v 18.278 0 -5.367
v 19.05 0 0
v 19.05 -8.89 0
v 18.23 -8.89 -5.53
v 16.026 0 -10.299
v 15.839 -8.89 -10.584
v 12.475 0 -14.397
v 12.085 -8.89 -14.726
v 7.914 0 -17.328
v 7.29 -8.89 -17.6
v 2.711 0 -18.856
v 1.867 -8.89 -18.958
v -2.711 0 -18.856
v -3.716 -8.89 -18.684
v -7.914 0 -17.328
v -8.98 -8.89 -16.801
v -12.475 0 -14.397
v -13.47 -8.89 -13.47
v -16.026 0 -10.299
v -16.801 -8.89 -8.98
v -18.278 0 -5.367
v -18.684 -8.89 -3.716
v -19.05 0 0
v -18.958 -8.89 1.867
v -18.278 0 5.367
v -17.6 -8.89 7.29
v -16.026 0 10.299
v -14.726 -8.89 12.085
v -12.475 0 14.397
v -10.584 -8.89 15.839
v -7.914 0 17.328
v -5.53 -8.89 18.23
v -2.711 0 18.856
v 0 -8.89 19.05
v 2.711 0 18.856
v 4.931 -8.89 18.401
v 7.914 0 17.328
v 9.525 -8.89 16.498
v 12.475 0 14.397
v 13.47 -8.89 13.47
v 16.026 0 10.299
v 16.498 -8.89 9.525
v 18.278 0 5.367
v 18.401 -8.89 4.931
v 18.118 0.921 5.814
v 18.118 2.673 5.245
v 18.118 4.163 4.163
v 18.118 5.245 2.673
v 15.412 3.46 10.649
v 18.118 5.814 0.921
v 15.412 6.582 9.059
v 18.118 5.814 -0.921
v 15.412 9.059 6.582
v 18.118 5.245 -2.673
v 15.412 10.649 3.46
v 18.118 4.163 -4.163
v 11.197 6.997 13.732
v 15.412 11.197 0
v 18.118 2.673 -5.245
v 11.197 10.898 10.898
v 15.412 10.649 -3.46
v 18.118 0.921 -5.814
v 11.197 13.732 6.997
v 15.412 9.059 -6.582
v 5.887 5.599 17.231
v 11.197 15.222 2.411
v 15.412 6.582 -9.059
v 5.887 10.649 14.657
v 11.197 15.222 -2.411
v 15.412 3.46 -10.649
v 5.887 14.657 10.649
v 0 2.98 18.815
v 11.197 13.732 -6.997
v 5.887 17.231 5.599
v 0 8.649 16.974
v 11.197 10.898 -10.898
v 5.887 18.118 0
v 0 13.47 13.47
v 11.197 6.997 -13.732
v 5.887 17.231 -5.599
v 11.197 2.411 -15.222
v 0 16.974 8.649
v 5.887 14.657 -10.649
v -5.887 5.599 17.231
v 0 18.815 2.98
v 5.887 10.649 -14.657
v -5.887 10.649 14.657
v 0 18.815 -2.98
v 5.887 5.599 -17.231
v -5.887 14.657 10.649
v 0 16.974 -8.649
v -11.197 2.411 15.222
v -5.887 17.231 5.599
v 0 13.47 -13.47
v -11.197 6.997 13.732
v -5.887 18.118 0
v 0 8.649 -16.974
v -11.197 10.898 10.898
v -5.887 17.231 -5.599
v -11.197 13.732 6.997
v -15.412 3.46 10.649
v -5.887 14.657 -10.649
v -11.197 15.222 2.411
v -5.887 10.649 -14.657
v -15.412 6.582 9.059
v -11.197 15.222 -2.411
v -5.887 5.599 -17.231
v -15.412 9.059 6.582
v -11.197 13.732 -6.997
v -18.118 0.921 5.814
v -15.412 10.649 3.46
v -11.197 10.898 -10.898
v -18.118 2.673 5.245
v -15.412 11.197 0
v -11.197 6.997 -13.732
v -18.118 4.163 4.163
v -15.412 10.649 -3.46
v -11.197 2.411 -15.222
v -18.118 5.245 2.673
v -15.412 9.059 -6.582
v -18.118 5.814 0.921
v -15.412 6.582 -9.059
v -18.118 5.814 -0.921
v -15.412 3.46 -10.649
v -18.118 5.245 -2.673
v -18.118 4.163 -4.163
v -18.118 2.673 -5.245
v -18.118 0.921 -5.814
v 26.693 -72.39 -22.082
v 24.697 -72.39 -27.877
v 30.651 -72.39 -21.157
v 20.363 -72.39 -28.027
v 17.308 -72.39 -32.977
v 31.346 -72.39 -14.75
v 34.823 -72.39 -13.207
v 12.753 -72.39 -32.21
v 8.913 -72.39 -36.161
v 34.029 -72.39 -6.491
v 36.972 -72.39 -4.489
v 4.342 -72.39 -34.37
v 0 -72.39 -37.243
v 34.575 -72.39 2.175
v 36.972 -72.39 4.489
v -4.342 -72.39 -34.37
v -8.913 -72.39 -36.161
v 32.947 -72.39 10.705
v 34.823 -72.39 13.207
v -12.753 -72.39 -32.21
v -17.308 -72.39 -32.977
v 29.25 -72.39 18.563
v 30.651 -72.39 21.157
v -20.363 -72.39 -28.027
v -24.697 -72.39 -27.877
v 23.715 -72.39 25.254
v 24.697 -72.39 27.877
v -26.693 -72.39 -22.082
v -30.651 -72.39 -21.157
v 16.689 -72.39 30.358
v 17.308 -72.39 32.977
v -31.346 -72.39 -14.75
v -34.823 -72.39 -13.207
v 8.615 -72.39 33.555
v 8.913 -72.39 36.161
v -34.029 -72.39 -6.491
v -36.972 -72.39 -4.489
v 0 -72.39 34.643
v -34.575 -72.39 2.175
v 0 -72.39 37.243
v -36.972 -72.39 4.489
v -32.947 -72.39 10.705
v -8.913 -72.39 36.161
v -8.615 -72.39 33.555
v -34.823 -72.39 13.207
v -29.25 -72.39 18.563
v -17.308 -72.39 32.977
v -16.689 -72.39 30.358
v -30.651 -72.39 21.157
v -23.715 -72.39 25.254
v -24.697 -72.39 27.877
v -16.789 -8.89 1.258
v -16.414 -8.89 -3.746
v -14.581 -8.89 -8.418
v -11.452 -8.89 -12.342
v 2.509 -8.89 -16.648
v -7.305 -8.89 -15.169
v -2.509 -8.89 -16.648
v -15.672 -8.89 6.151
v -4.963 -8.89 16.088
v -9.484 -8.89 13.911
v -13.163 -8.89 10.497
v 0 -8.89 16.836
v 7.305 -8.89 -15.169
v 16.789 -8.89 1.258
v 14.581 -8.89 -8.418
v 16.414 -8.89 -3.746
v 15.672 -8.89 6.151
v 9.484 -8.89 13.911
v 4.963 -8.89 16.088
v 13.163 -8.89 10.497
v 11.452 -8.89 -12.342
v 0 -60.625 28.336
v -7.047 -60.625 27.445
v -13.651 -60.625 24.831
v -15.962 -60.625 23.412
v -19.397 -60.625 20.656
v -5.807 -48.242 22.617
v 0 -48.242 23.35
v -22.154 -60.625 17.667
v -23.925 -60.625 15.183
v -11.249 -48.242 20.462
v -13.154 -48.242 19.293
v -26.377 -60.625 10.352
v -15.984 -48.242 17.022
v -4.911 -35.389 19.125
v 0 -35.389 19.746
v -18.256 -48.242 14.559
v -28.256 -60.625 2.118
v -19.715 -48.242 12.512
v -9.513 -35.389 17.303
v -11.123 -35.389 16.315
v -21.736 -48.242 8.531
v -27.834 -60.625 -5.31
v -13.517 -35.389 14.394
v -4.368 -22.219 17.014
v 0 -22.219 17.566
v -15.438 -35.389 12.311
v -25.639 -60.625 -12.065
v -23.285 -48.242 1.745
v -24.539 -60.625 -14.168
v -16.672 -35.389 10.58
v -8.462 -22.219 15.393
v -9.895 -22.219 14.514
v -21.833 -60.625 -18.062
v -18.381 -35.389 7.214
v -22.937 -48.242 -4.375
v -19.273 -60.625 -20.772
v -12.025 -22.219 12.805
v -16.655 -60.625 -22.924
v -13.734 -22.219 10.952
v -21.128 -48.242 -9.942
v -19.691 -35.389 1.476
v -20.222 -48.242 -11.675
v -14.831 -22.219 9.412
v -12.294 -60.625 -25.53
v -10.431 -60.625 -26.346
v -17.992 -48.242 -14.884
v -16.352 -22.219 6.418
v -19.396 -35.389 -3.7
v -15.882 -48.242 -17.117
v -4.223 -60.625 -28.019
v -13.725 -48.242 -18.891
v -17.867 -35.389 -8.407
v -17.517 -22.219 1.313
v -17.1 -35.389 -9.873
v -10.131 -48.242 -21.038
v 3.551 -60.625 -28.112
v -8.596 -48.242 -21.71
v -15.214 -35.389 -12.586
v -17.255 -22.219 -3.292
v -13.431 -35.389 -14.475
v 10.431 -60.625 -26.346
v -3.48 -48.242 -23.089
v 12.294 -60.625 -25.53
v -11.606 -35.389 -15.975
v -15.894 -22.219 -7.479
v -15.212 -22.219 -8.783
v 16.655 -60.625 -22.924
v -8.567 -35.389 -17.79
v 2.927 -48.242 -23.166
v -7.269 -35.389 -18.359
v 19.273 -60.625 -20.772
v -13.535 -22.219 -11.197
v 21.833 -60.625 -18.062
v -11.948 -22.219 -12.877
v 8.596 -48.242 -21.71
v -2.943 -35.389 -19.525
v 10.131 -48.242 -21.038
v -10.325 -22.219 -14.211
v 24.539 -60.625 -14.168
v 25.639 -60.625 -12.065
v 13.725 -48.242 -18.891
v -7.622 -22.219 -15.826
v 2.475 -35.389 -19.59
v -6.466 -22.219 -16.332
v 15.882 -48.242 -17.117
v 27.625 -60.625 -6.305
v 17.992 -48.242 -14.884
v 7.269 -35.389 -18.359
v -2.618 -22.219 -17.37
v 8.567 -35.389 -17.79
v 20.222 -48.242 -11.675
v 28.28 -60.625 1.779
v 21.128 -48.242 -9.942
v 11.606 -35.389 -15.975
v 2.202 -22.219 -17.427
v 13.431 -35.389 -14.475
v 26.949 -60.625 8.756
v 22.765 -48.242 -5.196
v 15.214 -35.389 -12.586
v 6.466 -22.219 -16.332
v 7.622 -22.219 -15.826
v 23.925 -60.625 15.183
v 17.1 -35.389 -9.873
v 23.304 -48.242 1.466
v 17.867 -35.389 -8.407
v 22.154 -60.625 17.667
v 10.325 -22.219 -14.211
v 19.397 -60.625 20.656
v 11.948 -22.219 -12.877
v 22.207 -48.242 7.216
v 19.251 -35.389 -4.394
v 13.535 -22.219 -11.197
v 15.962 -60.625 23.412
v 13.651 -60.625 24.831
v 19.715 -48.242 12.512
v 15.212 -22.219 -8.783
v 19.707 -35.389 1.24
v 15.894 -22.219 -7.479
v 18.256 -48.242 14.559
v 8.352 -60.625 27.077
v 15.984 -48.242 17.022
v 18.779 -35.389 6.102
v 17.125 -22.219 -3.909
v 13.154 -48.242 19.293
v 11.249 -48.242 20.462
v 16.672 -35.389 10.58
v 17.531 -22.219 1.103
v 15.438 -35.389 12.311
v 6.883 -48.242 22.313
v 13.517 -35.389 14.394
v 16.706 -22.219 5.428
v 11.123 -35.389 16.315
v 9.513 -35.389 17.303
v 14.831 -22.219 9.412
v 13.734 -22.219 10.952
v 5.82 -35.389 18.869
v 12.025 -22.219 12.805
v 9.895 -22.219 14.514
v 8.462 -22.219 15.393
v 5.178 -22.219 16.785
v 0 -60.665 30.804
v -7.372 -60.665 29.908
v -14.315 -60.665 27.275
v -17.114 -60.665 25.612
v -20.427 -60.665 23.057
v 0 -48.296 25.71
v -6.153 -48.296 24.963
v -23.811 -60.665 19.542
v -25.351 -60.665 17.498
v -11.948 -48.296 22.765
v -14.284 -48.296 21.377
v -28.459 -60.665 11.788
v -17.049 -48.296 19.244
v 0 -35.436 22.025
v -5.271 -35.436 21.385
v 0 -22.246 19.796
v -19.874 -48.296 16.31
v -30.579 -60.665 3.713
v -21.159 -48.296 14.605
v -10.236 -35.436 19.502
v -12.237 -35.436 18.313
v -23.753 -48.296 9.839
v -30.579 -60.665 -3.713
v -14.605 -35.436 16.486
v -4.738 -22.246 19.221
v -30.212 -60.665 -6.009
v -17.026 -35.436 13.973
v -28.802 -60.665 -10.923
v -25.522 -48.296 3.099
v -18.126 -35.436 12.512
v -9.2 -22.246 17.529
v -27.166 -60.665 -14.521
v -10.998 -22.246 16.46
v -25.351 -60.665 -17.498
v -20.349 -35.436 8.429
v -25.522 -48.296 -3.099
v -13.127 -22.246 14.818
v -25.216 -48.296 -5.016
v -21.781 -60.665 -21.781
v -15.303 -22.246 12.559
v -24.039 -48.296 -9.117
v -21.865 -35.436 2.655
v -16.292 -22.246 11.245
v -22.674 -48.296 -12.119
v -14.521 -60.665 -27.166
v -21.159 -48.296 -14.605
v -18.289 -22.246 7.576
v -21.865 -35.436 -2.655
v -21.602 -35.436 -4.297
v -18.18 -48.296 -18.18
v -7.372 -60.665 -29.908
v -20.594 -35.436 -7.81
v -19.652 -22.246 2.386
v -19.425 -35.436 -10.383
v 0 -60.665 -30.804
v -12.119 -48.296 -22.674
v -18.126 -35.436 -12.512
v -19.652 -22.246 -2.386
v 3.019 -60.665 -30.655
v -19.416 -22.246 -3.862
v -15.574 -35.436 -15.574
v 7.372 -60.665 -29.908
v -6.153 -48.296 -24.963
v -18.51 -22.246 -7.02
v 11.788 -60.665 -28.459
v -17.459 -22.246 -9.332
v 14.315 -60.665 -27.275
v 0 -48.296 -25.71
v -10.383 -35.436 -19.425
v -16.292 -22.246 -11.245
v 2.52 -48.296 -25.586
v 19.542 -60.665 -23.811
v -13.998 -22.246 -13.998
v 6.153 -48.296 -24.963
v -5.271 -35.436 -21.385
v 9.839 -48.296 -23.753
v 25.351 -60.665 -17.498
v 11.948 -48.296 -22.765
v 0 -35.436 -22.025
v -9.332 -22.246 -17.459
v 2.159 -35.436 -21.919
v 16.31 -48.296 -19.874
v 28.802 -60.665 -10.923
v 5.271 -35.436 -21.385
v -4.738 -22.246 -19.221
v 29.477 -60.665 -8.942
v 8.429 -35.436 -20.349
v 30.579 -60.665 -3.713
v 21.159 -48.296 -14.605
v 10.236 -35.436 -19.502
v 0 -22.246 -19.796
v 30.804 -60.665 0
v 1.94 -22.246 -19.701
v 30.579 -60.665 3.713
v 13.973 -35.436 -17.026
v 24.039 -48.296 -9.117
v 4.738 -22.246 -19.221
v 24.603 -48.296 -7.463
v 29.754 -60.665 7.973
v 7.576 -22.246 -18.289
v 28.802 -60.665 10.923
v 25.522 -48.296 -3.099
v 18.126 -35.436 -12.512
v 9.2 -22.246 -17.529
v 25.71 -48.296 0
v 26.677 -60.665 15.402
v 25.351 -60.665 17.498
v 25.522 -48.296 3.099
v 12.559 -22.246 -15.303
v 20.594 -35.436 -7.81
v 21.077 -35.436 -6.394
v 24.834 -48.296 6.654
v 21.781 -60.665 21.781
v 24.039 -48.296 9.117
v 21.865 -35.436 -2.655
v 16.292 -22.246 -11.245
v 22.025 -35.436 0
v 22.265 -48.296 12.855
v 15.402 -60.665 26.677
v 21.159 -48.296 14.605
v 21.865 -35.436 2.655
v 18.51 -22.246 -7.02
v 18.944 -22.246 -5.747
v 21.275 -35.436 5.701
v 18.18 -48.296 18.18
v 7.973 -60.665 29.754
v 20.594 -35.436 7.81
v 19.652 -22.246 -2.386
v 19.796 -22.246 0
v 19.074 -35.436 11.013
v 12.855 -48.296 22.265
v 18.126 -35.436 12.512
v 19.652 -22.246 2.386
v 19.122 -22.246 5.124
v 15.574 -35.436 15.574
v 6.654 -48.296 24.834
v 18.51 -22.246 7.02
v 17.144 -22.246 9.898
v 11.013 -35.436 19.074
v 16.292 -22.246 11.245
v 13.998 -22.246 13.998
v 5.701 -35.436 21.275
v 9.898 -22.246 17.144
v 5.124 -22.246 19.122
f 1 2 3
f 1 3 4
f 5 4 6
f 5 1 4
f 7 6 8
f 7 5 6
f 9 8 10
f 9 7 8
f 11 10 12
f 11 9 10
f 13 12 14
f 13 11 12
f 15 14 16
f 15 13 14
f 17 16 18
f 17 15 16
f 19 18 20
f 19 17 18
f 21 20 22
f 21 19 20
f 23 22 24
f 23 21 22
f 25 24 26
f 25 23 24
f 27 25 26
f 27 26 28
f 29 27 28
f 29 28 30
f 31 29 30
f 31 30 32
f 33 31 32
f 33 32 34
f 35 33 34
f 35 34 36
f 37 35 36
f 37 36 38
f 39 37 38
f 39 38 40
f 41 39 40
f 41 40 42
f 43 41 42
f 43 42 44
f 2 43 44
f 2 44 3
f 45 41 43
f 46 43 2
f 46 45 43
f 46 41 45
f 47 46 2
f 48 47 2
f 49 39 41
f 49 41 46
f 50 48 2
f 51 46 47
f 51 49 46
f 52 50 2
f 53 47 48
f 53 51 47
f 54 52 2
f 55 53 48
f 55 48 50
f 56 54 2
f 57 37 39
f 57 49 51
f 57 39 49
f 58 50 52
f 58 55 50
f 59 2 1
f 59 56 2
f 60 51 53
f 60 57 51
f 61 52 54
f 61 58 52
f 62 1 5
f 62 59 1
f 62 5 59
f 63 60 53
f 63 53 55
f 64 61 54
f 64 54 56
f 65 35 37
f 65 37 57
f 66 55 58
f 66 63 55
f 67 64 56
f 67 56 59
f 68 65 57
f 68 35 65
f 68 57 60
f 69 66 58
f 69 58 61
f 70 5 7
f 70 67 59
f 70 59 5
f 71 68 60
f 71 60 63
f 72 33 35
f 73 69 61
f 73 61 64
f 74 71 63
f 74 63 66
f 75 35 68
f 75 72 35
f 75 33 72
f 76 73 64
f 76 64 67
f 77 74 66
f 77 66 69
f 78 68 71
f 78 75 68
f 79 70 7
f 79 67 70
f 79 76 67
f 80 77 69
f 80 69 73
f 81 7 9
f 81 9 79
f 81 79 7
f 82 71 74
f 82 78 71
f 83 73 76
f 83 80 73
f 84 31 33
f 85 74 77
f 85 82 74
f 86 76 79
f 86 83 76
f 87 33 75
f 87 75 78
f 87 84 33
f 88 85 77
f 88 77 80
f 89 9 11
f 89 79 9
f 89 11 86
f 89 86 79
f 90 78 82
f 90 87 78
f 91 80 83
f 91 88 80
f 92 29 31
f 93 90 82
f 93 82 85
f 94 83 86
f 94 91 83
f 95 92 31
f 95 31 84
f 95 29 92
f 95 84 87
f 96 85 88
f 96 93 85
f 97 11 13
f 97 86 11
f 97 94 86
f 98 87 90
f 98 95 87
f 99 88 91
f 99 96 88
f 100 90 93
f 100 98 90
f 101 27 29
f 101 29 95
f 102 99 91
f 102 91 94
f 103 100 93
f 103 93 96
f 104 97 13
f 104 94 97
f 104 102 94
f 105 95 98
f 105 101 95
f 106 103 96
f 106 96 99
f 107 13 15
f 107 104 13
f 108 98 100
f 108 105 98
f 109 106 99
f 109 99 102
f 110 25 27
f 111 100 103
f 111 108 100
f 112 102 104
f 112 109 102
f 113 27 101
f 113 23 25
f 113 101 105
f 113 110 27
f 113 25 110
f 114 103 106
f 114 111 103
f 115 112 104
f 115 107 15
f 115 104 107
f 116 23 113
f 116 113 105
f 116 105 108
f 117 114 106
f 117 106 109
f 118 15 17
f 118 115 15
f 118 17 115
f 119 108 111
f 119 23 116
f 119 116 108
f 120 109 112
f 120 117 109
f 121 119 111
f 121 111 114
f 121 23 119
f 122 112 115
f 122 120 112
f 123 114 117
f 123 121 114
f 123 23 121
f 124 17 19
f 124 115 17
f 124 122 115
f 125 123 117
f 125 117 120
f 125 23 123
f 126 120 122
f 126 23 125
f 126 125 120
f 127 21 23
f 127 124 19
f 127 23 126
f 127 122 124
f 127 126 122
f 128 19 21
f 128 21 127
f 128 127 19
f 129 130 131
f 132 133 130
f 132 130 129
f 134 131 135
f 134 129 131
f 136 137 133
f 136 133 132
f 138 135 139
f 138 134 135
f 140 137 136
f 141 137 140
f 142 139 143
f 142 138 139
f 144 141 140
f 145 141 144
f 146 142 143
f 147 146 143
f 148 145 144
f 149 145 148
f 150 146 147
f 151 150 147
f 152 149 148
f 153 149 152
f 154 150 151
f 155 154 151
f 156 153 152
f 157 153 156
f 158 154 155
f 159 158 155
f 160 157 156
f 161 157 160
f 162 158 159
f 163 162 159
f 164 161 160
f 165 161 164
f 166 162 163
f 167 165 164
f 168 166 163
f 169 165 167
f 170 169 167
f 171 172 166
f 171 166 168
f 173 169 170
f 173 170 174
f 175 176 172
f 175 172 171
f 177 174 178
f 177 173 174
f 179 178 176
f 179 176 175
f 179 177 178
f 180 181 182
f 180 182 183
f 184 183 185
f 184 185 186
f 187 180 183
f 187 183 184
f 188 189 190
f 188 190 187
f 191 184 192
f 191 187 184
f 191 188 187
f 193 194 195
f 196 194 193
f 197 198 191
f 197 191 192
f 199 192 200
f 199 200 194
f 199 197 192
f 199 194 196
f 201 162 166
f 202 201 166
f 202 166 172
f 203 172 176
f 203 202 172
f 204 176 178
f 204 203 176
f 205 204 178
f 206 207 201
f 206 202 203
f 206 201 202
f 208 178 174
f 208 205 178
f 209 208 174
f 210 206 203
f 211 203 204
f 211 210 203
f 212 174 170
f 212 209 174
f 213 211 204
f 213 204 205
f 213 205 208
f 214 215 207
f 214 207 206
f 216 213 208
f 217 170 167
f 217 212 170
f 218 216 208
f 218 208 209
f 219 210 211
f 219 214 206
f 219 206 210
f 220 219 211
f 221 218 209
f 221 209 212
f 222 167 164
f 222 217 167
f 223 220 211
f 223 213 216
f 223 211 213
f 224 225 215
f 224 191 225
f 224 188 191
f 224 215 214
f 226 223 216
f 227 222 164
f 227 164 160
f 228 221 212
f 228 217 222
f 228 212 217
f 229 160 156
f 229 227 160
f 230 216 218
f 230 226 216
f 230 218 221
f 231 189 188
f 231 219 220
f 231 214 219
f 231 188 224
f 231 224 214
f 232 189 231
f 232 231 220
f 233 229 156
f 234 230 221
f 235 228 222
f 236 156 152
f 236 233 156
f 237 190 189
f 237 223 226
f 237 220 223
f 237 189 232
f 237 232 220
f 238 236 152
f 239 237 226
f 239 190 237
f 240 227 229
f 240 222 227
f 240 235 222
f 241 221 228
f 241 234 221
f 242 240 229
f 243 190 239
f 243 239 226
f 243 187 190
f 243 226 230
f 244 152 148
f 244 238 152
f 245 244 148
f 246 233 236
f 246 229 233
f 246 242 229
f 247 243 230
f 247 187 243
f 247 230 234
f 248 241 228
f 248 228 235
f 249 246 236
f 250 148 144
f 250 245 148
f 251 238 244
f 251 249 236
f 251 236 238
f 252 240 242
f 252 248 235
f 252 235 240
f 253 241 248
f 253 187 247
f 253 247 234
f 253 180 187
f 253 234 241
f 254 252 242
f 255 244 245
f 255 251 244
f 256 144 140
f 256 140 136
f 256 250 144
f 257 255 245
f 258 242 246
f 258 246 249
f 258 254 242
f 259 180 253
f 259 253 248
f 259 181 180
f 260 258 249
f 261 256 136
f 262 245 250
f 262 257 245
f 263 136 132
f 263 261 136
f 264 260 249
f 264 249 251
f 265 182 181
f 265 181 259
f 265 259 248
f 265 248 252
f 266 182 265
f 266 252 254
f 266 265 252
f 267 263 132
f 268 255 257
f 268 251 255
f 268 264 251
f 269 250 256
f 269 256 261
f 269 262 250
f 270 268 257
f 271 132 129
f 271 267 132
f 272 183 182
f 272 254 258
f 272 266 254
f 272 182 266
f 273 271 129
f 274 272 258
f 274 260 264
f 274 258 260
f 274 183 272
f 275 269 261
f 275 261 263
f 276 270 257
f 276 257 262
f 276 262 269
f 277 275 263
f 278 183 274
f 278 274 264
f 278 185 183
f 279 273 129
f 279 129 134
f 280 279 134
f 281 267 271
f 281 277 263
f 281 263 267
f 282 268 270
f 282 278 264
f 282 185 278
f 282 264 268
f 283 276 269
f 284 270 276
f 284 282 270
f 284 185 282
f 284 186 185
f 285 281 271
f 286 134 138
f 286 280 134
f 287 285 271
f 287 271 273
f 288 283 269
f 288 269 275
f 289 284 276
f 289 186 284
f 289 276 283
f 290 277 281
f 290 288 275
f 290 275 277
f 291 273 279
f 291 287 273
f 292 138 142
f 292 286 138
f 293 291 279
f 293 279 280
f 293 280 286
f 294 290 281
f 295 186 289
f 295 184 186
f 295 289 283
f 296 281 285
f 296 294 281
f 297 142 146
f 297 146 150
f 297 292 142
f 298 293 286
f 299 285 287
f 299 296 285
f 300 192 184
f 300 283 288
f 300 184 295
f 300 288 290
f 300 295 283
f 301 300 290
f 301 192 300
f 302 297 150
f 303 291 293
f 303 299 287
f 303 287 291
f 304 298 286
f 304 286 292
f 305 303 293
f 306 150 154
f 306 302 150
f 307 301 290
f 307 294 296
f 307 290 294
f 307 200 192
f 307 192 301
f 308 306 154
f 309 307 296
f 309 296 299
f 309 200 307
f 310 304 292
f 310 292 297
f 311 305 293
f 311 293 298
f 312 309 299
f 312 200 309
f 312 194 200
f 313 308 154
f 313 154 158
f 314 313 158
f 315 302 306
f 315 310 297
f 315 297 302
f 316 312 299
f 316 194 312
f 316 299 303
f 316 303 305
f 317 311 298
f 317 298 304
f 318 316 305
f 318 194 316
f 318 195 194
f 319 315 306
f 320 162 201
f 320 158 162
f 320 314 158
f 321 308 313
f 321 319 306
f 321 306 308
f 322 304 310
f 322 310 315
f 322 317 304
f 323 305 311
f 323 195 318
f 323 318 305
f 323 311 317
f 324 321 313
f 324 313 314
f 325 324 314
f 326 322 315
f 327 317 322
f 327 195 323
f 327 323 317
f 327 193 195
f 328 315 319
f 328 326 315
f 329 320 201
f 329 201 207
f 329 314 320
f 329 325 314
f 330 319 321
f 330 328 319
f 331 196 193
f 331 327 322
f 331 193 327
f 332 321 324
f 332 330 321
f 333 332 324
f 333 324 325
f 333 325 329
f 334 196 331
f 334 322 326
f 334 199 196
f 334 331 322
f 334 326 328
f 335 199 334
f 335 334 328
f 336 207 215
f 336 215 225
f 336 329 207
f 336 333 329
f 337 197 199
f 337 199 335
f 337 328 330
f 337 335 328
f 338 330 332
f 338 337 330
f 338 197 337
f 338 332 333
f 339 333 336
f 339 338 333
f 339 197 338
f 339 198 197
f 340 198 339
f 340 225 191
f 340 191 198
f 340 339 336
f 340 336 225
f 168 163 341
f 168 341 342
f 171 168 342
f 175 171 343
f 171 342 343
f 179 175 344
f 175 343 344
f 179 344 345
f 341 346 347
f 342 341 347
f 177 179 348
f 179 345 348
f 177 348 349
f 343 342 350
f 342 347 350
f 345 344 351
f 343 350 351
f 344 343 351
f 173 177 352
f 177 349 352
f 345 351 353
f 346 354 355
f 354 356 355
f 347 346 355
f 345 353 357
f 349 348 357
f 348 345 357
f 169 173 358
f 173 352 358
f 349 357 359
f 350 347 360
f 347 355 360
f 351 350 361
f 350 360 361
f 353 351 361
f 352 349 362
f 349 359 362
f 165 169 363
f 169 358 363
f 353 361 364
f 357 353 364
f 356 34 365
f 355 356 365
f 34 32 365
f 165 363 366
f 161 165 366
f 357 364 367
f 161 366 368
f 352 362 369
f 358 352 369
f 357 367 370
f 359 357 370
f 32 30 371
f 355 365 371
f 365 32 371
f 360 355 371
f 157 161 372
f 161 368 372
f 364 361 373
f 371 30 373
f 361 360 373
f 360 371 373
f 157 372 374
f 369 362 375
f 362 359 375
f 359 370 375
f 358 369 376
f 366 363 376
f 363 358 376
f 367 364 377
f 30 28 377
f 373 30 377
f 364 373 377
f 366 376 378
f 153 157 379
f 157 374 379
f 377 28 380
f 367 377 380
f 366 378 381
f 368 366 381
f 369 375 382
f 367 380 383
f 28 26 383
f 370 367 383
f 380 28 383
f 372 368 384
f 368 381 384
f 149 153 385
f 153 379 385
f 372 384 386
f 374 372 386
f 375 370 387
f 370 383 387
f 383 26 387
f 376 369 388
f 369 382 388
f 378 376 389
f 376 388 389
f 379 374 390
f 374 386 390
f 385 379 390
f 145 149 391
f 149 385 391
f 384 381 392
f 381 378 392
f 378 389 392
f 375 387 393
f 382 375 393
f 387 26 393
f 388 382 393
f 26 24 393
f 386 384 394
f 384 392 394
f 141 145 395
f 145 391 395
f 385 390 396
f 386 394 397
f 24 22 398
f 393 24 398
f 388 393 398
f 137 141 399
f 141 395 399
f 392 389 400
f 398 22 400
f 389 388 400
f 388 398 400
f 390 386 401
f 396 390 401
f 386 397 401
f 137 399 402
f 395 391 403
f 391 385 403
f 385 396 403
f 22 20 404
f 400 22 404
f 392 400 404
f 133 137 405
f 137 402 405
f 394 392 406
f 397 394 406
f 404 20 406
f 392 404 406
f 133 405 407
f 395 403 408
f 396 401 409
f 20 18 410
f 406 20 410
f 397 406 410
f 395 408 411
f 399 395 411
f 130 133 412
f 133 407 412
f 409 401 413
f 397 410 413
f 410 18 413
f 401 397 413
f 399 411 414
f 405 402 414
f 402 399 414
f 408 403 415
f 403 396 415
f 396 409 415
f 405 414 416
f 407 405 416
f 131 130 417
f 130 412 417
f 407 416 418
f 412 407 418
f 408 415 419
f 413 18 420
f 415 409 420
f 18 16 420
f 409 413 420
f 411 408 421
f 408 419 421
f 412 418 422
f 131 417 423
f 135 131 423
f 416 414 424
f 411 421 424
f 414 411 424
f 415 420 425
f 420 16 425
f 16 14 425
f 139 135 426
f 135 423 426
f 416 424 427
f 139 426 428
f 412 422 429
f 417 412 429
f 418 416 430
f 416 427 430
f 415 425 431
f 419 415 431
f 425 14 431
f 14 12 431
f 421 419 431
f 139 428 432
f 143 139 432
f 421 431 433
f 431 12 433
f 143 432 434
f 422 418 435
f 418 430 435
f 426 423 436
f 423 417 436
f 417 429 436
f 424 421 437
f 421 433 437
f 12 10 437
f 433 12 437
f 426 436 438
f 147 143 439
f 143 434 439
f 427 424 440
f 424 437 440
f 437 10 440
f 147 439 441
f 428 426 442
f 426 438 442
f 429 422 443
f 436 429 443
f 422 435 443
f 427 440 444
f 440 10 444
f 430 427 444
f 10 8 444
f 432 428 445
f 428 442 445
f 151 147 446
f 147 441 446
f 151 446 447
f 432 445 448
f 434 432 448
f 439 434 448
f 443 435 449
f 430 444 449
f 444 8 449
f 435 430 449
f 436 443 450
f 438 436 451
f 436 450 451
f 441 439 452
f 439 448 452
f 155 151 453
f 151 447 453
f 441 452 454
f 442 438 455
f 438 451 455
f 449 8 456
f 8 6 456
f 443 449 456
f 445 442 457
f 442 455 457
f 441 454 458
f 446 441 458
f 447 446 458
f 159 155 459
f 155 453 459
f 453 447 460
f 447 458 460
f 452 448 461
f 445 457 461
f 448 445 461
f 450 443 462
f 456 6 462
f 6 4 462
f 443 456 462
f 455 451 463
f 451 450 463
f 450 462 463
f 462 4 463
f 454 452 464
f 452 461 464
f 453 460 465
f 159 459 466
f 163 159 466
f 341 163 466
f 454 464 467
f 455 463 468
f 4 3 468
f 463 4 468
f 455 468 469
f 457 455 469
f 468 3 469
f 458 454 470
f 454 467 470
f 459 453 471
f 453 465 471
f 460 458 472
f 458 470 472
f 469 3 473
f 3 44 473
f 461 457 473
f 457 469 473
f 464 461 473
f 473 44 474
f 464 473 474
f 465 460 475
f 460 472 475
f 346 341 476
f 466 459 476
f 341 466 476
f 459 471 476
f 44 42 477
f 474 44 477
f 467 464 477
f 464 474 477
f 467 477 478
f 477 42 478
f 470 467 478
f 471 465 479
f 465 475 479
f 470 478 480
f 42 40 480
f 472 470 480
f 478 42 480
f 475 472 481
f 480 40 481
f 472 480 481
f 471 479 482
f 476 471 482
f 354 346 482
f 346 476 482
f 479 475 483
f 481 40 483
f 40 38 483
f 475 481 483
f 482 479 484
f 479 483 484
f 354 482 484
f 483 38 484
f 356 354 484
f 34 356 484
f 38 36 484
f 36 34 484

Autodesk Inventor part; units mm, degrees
ref_plane "YZ Plane" through (0, 0, 0) normal (1, 0, 0) x (0, 1, 0)
ref_plane "XZ Plane" through (0, 0, 0) normal (0, 1, 0) x (-1, 0, 0)
ref_plane "XY Plane" through (0, 0, 0) normal (0, 0, 1) x (1, 0, 0)
sketch "Sketch1" plane through (0, 0, 0) normal (0, 1, 0) x (-1, 0, 0)
  arc A0 (-19.05, 0) -> (19.05, 0) centre (0, 0) ccw
  line L0 (19.05, 0) -> (-19.05, 0)
revolve "Revolution1" add sketch "Sketch1" angle 180 about axis through (-19.05, 0, 0) along (1, 0, 0)
sketch "Sketch2" plane through (0, 0, 0) normal (0, -1, 0) x (1, 0, 0)
  circle A0 centre (0, 0) radius 19.05
extrude "Extrusion1" add sketch "Sketch2" along normal blind 8.89
sketch "Sketch3" plane through (0, 0, 0) normal (1, 0, 0) x (0, 1, 0)
  line L0 (-8.89, 19.05) -> (-8.89, -19.05) projected
  line L1 (-8.89, 0) -> (-72.39, 0)
  arc A0 (-72.39, 37.2434) -> (-8.89, 19.05) centre (-8.89, 138.9628) ccw
  arc A1 (-72.39, 34.643) -> (-8.89, 16.8363) centre (-8.89, 138.9628) ccw
  line L2 (-8.89, 16.8363) -> (0, 16.8363)
  line L3 (-72.39, 37.2434) -> (-72.39, 34.643)
  line L4 (-8.89, 16.8363) -> (-8.89, 19.05)
  point P0 (0, 0)
  point P1 (-8.89, 16.8363)
  dimension "d4" = 63.5
revolve "Revolution2" add sketch "Sketch3" angle 360 about axis through (0, -8.89, 0) along (0, -1, 0)
properties part number "cock1"
